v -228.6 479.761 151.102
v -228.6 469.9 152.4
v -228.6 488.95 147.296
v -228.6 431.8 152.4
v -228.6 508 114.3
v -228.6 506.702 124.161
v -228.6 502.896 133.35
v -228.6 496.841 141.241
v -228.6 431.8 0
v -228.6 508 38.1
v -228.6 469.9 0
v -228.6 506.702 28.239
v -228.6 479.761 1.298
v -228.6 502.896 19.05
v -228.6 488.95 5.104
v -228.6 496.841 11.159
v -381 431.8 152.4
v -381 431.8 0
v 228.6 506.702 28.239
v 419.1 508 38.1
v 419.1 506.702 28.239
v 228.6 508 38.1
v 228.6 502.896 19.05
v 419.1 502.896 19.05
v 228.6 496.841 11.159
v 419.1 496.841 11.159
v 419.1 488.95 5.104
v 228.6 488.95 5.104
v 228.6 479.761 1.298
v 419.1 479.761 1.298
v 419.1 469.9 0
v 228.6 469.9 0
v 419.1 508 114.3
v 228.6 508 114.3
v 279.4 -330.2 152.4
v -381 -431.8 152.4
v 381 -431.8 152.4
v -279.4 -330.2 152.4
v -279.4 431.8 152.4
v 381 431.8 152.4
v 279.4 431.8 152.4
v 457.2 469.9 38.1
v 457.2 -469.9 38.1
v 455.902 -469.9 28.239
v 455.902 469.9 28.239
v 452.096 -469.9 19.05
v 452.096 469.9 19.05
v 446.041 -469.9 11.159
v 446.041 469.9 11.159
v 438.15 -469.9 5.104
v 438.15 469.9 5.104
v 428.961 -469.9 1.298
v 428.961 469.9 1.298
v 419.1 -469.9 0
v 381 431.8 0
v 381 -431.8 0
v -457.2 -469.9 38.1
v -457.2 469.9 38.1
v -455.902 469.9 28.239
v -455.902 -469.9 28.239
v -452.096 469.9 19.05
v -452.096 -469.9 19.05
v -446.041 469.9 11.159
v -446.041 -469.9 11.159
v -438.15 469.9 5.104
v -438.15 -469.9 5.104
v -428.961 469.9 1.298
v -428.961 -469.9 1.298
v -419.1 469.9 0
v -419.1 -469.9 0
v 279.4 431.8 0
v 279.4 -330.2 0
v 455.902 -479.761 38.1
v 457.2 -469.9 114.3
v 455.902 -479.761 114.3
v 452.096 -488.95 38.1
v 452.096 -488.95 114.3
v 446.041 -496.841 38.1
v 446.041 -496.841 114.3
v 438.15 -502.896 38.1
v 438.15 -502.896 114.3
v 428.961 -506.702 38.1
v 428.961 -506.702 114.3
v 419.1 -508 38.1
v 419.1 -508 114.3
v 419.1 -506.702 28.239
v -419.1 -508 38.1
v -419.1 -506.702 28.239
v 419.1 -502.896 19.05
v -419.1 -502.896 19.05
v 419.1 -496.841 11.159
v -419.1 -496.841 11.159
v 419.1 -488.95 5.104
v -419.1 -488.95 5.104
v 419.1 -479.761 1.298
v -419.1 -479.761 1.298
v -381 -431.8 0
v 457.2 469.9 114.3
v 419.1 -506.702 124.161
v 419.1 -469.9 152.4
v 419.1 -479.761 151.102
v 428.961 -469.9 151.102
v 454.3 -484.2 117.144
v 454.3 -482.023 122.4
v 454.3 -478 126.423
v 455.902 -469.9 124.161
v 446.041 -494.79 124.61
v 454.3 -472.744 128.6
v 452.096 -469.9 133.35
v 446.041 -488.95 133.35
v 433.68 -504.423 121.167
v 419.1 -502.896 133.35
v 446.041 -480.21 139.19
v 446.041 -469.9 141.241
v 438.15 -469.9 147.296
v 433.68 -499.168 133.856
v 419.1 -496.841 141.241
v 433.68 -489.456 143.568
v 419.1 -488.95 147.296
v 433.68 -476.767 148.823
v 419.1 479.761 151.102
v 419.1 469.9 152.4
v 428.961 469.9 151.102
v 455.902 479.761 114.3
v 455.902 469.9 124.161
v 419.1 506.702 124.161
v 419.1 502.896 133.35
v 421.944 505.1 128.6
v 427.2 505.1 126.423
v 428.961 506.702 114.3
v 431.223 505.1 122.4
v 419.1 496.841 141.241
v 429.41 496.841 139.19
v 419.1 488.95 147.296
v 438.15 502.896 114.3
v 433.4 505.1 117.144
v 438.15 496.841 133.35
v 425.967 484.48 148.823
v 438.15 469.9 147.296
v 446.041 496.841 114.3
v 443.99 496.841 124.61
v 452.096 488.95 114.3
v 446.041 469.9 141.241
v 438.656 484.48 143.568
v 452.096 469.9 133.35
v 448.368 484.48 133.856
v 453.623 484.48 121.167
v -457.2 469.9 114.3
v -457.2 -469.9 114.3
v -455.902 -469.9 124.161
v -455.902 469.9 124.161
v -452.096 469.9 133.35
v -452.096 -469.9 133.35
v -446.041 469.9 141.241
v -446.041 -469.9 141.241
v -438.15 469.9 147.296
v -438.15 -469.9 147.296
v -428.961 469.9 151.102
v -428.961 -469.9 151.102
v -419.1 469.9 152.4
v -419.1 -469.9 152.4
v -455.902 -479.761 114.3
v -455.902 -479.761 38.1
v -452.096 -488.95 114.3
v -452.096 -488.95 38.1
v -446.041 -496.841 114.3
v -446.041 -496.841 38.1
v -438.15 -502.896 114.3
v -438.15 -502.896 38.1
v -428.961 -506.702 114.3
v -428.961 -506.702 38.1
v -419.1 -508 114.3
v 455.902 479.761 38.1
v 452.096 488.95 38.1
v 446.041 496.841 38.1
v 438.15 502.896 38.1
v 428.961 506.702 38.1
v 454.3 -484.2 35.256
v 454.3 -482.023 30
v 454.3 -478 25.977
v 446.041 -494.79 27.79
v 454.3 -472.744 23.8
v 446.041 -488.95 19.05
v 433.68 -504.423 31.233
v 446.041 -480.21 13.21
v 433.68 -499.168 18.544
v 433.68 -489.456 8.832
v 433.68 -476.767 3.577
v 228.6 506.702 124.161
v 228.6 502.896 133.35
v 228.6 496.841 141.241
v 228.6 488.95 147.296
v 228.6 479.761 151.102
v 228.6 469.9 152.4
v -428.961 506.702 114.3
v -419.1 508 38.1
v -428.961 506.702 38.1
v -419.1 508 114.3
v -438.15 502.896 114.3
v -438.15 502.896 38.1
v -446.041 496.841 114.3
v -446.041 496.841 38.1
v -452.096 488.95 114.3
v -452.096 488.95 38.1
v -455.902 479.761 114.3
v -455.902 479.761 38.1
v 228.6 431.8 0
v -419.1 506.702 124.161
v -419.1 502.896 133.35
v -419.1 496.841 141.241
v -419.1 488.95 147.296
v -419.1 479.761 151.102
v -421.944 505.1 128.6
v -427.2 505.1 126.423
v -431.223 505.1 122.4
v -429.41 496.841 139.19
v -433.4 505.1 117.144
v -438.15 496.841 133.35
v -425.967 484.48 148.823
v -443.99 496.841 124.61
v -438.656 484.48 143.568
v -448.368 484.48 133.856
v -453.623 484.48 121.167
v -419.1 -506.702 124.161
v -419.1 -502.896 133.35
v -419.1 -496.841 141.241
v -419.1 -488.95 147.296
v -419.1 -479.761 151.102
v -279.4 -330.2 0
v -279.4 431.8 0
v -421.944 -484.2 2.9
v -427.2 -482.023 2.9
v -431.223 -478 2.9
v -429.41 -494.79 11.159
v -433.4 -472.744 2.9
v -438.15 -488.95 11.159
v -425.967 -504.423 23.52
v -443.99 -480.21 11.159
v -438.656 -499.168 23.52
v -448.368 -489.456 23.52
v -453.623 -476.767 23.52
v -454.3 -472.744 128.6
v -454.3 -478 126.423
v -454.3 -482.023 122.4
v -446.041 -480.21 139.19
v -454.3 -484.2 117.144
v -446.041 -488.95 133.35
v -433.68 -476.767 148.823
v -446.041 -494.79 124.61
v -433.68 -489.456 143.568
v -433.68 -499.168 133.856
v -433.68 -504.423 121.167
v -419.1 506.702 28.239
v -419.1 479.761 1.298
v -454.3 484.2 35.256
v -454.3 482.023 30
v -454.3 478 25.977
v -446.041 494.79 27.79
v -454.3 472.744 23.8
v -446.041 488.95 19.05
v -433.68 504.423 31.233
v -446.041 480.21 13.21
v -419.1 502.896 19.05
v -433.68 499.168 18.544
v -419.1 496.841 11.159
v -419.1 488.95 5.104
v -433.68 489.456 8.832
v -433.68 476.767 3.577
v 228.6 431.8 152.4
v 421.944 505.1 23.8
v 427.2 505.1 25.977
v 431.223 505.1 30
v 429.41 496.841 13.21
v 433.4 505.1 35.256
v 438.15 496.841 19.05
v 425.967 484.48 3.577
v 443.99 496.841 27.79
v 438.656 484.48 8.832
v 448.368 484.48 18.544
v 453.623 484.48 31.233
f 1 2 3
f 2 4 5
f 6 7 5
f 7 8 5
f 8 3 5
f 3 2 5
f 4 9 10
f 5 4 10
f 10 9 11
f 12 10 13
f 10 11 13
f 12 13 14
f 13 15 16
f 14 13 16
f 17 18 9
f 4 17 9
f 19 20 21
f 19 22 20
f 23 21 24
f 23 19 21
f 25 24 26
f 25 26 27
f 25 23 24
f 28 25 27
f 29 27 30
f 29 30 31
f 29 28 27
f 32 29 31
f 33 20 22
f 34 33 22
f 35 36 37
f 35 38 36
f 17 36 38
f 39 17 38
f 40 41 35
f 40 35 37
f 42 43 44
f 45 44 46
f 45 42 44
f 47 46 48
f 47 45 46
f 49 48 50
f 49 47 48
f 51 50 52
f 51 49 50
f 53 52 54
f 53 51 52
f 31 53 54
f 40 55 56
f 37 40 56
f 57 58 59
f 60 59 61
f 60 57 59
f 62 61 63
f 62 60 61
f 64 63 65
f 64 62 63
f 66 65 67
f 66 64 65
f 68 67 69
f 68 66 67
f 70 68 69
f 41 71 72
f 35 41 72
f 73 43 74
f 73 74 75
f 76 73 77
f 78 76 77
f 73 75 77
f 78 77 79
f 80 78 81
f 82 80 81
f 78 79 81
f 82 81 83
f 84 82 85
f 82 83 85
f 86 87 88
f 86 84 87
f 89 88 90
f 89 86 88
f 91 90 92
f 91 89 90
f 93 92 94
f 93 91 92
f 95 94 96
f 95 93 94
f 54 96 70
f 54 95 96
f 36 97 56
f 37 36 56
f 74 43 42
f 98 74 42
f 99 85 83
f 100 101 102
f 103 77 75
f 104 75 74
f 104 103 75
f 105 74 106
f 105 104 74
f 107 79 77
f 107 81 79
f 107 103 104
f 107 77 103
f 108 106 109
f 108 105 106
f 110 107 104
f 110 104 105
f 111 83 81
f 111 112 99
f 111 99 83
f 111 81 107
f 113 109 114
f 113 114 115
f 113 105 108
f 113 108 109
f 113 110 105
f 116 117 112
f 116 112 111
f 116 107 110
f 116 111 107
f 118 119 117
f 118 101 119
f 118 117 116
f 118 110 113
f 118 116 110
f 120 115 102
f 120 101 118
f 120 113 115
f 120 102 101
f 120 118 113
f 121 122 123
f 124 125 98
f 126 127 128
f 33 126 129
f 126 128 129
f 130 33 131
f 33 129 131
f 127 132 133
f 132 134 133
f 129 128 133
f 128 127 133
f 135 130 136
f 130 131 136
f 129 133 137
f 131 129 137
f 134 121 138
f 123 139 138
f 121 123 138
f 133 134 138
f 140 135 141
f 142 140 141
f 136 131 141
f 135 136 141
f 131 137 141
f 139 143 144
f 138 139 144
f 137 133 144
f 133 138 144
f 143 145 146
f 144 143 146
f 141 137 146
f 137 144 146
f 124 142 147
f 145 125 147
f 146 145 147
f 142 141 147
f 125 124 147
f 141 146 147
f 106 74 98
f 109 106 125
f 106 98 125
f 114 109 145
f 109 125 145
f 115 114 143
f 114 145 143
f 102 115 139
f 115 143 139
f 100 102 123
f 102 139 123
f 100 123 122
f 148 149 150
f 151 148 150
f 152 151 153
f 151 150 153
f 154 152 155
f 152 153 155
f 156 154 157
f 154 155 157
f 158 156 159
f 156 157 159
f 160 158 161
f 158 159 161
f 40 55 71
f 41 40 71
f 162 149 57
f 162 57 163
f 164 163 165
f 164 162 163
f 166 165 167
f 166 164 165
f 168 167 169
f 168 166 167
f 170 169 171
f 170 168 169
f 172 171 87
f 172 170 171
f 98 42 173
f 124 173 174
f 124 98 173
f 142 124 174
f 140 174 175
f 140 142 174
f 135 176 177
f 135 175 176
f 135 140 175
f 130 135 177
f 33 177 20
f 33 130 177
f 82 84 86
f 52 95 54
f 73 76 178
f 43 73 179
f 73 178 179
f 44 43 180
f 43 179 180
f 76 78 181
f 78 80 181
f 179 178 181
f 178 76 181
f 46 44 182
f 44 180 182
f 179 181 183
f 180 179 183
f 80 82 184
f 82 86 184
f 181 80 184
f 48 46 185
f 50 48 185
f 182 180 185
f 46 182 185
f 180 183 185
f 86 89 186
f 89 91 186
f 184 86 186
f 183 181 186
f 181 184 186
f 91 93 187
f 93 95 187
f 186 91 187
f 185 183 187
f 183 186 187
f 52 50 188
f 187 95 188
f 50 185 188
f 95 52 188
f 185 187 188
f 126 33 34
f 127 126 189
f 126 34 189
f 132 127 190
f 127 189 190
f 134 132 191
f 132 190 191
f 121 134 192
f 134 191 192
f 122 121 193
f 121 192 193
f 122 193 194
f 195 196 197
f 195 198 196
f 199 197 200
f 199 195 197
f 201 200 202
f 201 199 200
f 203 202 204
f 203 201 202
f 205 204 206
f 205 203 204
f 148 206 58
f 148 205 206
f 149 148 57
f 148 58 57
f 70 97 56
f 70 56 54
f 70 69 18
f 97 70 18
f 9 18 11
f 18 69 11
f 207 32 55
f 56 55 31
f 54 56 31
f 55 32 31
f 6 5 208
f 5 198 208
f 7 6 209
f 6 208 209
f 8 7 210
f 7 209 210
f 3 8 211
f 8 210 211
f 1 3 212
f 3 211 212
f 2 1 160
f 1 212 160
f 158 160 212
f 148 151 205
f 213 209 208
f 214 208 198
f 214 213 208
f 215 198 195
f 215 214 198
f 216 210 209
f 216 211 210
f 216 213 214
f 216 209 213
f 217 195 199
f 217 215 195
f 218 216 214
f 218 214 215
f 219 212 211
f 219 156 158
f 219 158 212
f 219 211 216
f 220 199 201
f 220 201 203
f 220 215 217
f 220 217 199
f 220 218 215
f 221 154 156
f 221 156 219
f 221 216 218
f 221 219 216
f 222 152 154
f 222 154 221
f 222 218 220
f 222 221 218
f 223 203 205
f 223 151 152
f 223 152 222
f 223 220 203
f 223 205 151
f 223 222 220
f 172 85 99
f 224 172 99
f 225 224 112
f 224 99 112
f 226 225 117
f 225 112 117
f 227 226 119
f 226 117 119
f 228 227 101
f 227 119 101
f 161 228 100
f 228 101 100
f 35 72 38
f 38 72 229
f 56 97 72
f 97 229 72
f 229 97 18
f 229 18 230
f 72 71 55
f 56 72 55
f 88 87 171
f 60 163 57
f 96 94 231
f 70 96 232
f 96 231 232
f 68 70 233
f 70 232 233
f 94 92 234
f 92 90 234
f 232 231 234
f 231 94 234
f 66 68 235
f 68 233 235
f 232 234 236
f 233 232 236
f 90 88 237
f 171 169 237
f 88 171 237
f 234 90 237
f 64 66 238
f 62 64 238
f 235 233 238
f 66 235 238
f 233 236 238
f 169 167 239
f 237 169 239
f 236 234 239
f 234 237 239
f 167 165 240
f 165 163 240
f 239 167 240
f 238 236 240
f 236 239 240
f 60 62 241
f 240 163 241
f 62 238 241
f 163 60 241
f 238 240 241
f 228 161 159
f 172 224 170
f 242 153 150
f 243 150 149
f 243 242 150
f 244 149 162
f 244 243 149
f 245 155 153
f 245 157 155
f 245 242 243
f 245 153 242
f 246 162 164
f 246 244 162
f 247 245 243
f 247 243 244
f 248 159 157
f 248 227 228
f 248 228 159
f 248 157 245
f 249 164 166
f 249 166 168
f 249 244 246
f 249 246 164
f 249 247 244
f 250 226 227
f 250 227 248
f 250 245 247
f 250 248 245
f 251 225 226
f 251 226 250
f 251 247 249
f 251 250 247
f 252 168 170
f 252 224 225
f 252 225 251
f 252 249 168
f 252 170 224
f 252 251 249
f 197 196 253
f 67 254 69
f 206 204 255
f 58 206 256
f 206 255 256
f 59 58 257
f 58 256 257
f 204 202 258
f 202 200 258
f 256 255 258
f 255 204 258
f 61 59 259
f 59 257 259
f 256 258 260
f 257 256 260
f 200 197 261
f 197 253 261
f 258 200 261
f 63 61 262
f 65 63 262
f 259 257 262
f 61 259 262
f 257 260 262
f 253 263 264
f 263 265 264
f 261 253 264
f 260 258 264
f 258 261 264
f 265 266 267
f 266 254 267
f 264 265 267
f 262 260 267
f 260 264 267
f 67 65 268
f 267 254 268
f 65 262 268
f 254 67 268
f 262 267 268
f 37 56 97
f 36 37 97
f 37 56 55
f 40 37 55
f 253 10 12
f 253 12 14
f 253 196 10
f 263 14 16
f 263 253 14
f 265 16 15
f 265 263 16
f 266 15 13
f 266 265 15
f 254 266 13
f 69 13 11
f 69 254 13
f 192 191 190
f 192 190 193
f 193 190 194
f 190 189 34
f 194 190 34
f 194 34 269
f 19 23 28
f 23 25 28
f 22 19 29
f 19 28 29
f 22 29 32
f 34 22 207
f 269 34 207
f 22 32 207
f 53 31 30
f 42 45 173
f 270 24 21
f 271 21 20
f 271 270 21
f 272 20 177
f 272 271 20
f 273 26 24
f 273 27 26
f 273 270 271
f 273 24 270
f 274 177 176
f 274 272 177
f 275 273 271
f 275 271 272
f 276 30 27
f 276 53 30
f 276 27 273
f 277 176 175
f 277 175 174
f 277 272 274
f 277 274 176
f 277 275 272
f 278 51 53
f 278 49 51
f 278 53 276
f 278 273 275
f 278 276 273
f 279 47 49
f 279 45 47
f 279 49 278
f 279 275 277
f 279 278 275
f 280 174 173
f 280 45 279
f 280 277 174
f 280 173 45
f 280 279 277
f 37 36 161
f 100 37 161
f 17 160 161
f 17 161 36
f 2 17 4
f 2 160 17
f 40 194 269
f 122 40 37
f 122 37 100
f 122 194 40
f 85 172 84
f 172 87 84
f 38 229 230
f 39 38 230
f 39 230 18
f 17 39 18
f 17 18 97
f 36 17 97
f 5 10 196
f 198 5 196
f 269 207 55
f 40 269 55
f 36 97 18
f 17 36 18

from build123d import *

# Parameters (mm, degrees)
F1_DEPTH = 152.4
F2_R     = 38.1
F4_DEPTH = 152.4


with BuildPart() as f1:
    # F0 (on Top) → F1 (new body)
    with BuildSketch(Plane.XY):
        Polygon((457.2, -508), (457.2, 508), (228.6, 508), (228.6, 431.8), (381, 431.8), (381, -431.8), (-381, -431.8), (-381, 431.8), (-228.6, 431.8), (-228.6, 508), (-457.2, 508), (-457.2, -508), align=None)
    extrude(amount=F1_DEPTH)

    # F2
    f2_edges = [f1.edges().sort_by_distance(p)[0] for p in [
        (0, -508, 152.4),
        (-457.2, 0, 152.4),
        (-457.2, -508, 76.2),
        (0, -508, 0),
        (457.2, -508, 76.2),
        (457.2, 0, 152.4),
        (457.2, 0, 0),
        (342.9, 508, 152.4),
        (-342.9, 508, 152.4),
        (342.9, 508, 0),
        (-342.9, 508, 0),
        (457.2, 508, 76.2),
        (-457.2, 508, 76.2),
        (-457.2, 0, 0),
    ]]
    fillet(f2_edges, radius=F2_R)


with BuildPart() as f4:
    # F3 (on Top) → F4 (new body)
    with BuildSketch(Plane.XY):
        Polygon((-279.4, 431.8), (-381, 431.8), (-381, -431.8), (381, -431.8), (381, 431.8), (279.4, 431.8), (279.4, -330.2), (-279.4, -330.2), align=None)
    extrude(amount=F4_DEPTH)


solid = Compound([f1.part, f4.part])
